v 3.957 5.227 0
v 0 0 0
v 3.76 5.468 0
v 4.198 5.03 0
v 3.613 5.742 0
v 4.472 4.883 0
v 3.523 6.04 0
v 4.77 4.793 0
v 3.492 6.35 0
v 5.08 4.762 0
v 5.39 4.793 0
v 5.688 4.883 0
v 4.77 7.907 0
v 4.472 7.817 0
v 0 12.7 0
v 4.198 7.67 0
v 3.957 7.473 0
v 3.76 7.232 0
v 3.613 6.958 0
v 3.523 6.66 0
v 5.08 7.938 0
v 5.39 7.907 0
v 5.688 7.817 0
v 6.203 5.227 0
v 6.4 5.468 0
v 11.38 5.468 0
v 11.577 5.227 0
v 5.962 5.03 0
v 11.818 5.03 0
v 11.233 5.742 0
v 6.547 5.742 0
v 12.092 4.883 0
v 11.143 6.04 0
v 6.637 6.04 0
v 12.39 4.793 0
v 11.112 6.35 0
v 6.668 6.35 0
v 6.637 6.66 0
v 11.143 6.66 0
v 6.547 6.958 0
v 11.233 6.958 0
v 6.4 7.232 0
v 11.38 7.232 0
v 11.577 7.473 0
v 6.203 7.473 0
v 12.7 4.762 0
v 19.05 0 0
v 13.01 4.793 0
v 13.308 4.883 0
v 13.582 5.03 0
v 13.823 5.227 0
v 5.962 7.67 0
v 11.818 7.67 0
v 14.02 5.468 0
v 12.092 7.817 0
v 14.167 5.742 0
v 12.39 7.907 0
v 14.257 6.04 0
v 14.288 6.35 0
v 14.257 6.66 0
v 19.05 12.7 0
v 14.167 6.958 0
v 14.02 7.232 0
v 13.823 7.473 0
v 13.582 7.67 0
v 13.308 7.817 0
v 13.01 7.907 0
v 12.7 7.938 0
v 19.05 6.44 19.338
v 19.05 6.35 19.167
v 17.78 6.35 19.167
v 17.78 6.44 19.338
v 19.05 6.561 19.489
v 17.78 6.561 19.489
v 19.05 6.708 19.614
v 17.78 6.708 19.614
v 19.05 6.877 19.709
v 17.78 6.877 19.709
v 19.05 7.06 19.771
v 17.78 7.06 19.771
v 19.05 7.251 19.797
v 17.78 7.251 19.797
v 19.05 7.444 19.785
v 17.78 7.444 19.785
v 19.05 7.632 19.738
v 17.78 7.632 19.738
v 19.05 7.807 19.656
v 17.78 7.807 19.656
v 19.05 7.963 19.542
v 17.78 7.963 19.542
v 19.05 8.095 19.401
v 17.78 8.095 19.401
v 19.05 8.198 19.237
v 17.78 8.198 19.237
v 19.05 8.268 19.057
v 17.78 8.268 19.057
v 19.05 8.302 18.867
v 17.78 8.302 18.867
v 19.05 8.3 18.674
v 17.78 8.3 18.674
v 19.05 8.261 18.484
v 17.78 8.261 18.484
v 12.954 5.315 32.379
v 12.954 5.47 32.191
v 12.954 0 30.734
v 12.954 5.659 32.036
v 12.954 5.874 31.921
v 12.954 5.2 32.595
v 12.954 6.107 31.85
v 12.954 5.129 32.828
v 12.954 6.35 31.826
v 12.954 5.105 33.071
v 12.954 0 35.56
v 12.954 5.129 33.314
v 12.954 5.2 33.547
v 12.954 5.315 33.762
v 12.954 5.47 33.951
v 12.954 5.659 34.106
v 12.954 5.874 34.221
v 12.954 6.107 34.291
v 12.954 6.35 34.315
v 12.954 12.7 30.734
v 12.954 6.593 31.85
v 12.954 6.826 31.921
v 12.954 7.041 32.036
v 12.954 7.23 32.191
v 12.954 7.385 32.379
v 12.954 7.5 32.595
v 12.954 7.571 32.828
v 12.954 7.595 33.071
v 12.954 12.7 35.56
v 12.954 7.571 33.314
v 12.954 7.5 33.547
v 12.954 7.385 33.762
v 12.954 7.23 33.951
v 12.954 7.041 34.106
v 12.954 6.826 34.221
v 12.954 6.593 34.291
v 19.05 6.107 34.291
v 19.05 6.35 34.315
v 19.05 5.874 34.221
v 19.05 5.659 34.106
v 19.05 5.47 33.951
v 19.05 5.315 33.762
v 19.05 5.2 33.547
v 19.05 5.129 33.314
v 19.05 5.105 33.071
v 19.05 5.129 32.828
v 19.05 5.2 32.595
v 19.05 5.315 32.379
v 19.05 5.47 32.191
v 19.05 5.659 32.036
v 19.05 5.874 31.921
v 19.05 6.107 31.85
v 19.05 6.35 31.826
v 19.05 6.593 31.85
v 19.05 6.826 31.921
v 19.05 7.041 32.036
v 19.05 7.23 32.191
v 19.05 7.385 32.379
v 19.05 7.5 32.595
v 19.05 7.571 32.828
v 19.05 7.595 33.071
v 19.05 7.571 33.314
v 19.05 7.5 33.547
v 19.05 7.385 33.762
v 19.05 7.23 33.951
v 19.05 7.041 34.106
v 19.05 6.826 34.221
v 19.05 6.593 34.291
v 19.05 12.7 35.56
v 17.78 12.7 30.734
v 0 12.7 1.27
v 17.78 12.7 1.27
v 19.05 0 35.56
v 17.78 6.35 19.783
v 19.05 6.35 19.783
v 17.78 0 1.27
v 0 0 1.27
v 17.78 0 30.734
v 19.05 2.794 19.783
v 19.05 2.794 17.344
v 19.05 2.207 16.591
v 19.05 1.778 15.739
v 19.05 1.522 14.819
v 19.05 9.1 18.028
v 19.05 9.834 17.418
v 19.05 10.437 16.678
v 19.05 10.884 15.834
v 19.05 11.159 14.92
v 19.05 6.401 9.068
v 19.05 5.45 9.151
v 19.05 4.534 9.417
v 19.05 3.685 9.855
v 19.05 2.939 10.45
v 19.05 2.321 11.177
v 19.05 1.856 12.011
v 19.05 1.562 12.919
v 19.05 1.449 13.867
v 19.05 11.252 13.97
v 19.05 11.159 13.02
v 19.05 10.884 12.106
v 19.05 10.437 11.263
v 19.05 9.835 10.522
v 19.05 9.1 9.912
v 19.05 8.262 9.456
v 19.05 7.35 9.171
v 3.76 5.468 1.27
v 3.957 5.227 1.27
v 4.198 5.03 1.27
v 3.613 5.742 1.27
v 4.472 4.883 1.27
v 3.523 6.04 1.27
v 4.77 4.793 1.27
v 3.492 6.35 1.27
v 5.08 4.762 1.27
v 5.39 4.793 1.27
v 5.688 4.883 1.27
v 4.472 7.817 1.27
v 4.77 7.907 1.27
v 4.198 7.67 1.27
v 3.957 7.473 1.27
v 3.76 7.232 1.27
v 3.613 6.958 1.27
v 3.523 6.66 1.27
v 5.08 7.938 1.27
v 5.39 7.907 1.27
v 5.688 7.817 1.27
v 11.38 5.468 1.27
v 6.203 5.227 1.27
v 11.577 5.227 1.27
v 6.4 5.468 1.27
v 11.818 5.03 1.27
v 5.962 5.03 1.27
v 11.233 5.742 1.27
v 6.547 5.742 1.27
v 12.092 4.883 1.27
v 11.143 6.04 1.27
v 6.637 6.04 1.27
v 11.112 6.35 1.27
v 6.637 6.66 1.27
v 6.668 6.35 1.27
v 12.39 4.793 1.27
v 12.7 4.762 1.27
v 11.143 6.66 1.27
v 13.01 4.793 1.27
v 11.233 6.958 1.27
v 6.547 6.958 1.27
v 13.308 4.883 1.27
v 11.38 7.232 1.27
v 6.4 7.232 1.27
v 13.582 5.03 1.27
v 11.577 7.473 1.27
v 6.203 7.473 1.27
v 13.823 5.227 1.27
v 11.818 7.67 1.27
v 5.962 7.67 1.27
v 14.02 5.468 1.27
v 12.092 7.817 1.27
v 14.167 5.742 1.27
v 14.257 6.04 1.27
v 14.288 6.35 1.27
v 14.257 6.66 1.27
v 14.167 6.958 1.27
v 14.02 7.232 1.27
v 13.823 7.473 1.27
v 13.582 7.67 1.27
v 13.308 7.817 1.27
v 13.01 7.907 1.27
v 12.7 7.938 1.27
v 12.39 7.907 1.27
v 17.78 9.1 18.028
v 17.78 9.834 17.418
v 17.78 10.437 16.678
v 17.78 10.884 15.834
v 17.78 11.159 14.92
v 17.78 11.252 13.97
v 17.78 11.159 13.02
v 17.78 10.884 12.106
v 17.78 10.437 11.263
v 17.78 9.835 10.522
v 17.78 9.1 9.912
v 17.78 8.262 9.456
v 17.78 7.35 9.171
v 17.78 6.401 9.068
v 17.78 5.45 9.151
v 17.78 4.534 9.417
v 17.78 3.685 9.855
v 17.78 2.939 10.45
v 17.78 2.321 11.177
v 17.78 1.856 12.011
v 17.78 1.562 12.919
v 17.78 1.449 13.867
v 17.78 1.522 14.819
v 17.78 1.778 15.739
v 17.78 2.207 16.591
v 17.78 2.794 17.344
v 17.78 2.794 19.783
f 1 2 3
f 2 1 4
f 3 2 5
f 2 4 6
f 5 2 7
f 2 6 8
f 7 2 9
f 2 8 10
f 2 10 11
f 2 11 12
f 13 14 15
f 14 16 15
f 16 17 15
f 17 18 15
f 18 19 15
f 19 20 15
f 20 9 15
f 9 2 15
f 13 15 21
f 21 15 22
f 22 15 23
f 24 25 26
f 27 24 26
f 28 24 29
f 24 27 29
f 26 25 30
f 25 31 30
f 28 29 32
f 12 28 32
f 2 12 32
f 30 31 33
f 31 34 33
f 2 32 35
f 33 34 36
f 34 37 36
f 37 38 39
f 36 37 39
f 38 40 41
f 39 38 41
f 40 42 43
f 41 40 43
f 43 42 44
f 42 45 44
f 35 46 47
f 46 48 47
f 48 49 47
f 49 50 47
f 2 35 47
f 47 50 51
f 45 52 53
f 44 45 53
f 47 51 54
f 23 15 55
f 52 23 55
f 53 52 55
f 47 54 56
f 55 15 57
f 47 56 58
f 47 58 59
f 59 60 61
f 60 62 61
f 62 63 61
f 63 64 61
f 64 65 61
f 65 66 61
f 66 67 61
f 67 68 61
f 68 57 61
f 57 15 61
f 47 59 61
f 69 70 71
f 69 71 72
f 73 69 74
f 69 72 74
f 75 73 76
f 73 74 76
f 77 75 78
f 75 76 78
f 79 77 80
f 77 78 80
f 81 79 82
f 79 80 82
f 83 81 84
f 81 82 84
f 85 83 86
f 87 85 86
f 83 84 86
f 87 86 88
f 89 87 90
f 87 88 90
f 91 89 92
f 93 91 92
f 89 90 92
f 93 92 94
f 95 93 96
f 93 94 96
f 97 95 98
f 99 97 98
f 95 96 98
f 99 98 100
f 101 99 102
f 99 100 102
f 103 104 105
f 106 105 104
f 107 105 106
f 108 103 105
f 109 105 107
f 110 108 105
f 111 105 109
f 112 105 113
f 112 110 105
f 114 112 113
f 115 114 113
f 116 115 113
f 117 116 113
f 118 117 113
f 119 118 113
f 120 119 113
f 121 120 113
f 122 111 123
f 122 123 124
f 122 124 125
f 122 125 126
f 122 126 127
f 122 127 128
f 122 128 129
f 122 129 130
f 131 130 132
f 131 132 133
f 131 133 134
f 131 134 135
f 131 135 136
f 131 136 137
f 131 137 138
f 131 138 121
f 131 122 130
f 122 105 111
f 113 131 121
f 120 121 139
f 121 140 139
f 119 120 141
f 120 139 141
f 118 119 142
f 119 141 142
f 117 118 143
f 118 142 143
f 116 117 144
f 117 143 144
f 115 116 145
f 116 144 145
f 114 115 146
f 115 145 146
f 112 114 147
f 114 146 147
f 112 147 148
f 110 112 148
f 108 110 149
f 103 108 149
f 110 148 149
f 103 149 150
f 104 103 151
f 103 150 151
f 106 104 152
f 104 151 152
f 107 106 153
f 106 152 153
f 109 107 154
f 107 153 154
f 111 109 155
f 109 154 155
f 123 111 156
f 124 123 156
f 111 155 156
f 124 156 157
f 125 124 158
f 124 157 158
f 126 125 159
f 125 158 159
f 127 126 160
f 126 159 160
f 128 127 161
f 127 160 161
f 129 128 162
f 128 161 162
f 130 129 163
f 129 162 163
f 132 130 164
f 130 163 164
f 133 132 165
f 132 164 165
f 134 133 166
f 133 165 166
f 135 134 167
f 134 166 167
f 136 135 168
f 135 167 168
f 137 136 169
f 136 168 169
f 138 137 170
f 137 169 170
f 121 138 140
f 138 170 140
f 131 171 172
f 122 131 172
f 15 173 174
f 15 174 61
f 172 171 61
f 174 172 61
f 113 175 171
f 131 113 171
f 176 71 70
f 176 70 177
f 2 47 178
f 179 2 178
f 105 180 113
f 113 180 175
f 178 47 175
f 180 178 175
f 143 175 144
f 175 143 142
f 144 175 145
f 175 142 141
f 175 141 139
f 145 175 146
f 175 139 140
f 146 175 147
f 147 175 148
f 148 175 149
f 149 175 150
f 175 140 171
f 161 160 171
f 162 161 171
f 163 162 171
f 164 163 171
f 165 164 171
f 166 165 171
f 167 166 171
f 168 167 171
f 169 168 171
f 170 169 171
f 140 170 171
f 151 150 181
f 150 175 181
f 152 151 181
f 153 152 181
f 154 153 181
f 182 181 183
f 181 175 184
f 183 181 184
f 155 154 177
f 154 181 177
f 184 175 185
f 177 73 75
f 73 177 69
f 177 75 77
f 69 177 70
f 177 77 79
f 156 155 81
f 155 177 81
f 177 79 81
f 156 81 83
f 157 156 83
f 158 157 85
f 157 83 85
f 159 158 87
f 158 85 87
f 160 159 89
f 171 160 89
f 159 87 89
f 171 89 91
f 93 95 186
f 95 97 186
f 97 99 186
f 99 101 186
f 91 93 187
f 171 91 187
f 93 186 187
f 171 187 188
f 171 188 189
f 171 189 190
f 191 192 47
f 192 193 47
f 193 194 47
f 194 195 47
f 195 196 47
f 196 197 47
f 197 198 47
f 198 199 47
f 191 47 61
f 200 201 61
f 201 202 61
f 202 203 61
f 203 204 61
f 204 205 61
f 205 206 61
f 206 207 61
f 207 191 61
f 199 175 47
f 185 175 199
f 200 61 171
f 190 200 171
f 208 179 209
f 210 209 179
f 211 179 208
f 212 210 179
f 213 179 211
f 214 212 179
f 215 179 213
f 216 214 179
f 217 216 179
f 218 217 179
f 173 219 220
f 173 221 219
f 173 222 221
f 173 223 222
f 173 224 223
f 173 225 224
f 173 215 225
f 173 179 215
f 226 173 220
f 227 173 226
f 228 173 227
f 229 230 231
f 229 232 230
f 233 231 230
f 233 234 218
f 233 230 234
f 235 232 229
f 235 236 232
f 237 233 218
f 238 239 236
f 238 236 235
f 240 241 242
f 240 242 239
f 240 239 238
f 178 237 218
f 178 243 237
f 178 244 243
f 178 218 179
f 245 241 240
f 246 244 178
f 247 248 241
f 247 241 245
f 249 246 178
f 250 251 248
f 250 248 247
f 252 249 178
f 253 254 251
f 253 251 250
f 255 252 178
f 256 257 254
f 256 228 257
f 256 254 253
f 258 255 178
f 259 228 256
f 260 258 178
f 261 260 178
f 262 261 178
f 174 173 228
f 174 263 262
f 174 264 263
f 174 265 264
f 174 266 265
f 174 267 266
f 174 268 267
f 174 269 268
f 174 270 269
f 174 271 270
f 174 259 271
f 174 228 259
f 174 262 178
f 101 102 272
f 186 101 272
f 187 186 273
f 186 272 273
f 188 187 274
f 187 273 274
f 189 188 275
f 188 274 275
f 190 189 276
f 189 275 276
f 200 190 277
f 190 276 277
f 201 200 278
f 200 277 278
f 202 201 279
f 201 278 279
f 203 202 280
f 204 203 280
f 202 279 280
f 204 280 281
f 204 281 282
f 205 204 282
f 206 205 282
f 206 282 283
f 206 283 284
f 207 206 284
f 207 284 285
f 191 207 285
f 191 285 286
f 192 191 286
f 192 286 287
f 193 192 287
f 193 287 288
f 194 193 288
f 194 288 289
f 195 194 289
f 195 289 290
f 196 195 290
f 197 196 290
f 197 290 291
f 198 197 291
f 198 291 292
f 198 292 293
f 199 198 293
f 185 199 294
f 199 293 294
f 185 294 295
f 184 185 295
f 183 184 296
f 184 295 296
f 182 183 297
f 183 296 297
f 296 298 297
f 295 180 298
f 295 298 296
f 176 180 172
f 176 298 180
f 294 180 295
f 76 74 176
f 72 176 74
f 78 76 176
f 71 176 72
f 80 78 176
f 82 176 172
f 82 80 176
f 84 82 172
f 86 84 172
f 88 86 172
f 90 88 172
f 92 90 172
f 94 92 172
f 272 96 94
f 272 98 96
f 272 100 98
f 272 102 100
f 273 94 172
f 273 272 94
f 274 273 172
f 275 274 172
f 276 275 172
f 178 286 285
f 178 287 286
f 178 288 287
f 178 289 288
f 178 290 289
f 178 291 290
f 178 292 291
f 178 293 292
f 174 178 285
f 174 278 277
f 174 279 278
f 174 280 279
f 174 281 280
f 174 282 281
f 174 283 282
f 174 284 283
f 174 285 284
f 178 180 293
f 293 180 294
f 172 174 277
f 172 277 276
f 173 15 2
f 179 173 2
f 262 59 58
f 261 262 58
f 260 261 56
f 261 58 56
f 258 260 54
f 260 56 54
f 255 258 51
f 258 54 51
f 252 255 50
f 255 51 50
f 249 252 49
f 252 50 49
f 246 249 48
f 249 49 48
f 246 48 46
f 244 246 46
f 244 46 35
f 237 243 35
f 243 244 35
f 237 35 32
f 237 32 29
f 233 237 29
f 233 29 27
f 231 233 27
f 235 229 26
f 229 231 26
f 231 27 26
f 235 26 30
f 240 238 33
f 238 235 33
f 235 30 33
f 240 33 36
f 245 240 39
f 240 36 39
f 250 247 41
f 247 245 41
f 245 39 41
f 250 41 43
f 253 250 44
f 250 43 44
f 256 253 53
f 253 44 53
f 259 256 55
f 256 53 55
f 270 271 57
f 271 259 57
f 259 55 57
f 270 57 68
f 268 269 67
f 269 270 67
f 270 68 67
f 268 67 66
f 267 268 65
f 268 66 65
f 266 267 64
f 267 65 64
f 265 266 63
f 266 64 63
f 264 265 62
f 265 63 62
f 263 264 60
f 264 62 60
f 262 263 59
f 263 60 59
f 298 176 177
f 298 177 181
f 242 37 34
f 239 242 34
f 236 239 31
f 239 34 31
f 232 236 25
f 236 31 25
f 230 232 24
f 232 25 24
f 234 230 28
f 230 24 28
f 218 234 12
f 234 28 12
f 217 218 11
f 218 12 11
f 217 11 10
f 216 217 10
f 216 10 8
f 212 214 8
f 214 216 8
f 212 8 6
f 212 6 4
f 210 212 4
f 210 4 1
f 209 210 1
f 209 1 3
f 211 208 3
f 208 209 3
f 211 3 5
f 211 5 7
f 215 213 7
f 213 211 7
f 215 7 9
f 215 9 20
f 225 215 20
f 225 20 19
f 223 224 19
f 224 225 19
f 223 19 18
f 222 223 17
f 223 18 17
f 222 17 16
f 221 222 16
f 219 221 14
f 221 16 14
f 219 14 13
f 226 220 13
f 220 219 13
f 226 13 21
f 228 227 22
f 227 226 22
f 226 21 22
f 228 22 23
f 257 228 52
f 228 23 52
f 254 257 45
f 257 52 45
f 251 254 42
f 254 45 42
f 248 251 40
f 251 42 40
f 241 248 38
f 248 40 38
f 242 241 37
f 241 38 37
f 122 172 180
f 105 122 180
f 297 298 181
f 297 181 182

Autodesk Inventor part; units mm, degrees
ref_plane "YZ Plane" through (0, 0, 0) normal (1, 0, 0) x (0, 1, 0)
ref_plane "XZ Plane" through (0, 0, 0) normal (0, 1, 0) x (-1, 0, 0)
ref_plane "XY Plane" through (0, 0, 0) normal (0, 0, 1) x (1, 0, 0)
sketch "Sketch1" plane through (0, 0, 0) normal (0, 0, 1) x (1, 0, 0)
  line L0 (0, 0) -> (19.05, 0)
  line L1 (19.05, 0) -> (19.05, 12.7)
  line L2 (19.05, 12.7) -> (0, 12.7)
  line L3 (0, 12.7) -> (0, 0)
  circle A0 centre (5.08, 6.35) radius 1.5875
  circle A1 centre (12.7, 6.35) radius 1.5875
  dimension "d0" = 12.7
  dimension "d1" = 19.05
  dimension "d2" = 3.175
  dimension "d3" = 3.175
  dimension "d4" = 6.35
  dimension "d5" = 5.08
  dimension "d6" = 7.62
extrude "Extrusion1" add sketch "Sketch1" along normal blind 1.27
sketch "Sketch2" plane through (0, 0, 1.27) normal (0, 0, 1) x (1, 0, 0)
  line L0 (19.05, 12.7) -> (0, 12.7) projected
  line L1 (19.05, 0) -> (17.78, 0)
  line L2 (17.78, 0) -> (17.78, 12.7)
  line L3 (17.78, 12.7) -> (19.05, 12.7)
  line L4 (19.05, 12.7) -> (19.05, 0)
  point P0 (0, 0)
  dimension "d9" = 1.27
extrude "Extrusion2" add sketch "Sketch2" along normal blind 34.29
sketch "Sketch3" plane through (17.78, 0, 1.27) normal (-1, 0, 0) x (0, 0, 1)
  line L0 (0, 12.7) -> (0, 0) projected
  line L1 (0, 12.7) -> (34.29, 12.7) projected
  arc A0 (17.2142, 8.2614) -> (16.0744, 2.794) centre (12.7, 6.35) ccw
  line L2 (17.6022, 6.35) -> (18.5128, 6.35)
  line L3 (18.5128, 6.35) -> (18.5128, 2.794)
  line L4 (18.5128, 2.794) -> (16.0744, 2.794)
  line L5 (16.0744, 2.794) -> (16.0744, 6.35)
  arc A1 (17.8973, 6.35) -> (17.2142, 8.2614) centre (17.5113, 7.2898) ccw
  point P0 (-1.27, 0)
  point P1 (17.2936, 6.35)
  dimension "d21" = 9.8044
  dimension "d22" = 12.7
  dimension "d23" = 6.35
  dimension "d24" = 3.556
  dimension "d25" = 2.4384
  dimension "d26" = 2.032
  dimension "d27" = 0.9398
  dimension "d28" = 3.556
extrude "Extrusion3" cut sketch "Sketch3" against normal blind 25.4
sketch "Sketch4" plane through (17.78, 0, 1.27) normal (-1, 0, 0) x (0, 0, 1)
  line L0 (34.29, 12.7) -> (29.464, 12.7)
  line L1 (29.464, 12.7) -> (29.464, 0)
  line L2 (29.464, 0) -> (34.29, 0)
  line L3 (34.29, 0) -> (34.29, 12.7)
  arc A0 (17.2142, 8.2614) -> (16.0744, 2.794) centre (12.7, 6.35) ccw projected
  line L4 (0, 0) -> (34.29, 0) projected
  point P0 (-1.27, 0)
  point P1 (31.877, 0)
  dimension "d29" = 16.764
extrude "Extrusion4" add sketch "Sketch4" along normal blind 4.826
sketch "Sketch5" plane through (12.954, 0, 1.27) normal (-1, 0, 0) x (0, 0, 1)
  line L0 (34.29, 12.7) -> (29.464, 12.7) projected
  line L1 (29.464, 12.7) -> (29.464, 0) projected
  line L2 (29.464, 0) -> (34.29, 0) projected
  line L3 (34.29, 0) -> (34.29, 12.7) projected
  point P0 (-1.27, 0)
  point P1 (31.8008, 6.35)
  dimension "d33" = 4.826
  dimension "d35" = 12.7
  dimension "d38" = 6.35
  dimension "d46" = 2.3368
hole "Hole1" at (12.954, 6.35, 33.0708) direction (1, 0, 0) diameter 2.4892 end through all
properties part number "000208"
